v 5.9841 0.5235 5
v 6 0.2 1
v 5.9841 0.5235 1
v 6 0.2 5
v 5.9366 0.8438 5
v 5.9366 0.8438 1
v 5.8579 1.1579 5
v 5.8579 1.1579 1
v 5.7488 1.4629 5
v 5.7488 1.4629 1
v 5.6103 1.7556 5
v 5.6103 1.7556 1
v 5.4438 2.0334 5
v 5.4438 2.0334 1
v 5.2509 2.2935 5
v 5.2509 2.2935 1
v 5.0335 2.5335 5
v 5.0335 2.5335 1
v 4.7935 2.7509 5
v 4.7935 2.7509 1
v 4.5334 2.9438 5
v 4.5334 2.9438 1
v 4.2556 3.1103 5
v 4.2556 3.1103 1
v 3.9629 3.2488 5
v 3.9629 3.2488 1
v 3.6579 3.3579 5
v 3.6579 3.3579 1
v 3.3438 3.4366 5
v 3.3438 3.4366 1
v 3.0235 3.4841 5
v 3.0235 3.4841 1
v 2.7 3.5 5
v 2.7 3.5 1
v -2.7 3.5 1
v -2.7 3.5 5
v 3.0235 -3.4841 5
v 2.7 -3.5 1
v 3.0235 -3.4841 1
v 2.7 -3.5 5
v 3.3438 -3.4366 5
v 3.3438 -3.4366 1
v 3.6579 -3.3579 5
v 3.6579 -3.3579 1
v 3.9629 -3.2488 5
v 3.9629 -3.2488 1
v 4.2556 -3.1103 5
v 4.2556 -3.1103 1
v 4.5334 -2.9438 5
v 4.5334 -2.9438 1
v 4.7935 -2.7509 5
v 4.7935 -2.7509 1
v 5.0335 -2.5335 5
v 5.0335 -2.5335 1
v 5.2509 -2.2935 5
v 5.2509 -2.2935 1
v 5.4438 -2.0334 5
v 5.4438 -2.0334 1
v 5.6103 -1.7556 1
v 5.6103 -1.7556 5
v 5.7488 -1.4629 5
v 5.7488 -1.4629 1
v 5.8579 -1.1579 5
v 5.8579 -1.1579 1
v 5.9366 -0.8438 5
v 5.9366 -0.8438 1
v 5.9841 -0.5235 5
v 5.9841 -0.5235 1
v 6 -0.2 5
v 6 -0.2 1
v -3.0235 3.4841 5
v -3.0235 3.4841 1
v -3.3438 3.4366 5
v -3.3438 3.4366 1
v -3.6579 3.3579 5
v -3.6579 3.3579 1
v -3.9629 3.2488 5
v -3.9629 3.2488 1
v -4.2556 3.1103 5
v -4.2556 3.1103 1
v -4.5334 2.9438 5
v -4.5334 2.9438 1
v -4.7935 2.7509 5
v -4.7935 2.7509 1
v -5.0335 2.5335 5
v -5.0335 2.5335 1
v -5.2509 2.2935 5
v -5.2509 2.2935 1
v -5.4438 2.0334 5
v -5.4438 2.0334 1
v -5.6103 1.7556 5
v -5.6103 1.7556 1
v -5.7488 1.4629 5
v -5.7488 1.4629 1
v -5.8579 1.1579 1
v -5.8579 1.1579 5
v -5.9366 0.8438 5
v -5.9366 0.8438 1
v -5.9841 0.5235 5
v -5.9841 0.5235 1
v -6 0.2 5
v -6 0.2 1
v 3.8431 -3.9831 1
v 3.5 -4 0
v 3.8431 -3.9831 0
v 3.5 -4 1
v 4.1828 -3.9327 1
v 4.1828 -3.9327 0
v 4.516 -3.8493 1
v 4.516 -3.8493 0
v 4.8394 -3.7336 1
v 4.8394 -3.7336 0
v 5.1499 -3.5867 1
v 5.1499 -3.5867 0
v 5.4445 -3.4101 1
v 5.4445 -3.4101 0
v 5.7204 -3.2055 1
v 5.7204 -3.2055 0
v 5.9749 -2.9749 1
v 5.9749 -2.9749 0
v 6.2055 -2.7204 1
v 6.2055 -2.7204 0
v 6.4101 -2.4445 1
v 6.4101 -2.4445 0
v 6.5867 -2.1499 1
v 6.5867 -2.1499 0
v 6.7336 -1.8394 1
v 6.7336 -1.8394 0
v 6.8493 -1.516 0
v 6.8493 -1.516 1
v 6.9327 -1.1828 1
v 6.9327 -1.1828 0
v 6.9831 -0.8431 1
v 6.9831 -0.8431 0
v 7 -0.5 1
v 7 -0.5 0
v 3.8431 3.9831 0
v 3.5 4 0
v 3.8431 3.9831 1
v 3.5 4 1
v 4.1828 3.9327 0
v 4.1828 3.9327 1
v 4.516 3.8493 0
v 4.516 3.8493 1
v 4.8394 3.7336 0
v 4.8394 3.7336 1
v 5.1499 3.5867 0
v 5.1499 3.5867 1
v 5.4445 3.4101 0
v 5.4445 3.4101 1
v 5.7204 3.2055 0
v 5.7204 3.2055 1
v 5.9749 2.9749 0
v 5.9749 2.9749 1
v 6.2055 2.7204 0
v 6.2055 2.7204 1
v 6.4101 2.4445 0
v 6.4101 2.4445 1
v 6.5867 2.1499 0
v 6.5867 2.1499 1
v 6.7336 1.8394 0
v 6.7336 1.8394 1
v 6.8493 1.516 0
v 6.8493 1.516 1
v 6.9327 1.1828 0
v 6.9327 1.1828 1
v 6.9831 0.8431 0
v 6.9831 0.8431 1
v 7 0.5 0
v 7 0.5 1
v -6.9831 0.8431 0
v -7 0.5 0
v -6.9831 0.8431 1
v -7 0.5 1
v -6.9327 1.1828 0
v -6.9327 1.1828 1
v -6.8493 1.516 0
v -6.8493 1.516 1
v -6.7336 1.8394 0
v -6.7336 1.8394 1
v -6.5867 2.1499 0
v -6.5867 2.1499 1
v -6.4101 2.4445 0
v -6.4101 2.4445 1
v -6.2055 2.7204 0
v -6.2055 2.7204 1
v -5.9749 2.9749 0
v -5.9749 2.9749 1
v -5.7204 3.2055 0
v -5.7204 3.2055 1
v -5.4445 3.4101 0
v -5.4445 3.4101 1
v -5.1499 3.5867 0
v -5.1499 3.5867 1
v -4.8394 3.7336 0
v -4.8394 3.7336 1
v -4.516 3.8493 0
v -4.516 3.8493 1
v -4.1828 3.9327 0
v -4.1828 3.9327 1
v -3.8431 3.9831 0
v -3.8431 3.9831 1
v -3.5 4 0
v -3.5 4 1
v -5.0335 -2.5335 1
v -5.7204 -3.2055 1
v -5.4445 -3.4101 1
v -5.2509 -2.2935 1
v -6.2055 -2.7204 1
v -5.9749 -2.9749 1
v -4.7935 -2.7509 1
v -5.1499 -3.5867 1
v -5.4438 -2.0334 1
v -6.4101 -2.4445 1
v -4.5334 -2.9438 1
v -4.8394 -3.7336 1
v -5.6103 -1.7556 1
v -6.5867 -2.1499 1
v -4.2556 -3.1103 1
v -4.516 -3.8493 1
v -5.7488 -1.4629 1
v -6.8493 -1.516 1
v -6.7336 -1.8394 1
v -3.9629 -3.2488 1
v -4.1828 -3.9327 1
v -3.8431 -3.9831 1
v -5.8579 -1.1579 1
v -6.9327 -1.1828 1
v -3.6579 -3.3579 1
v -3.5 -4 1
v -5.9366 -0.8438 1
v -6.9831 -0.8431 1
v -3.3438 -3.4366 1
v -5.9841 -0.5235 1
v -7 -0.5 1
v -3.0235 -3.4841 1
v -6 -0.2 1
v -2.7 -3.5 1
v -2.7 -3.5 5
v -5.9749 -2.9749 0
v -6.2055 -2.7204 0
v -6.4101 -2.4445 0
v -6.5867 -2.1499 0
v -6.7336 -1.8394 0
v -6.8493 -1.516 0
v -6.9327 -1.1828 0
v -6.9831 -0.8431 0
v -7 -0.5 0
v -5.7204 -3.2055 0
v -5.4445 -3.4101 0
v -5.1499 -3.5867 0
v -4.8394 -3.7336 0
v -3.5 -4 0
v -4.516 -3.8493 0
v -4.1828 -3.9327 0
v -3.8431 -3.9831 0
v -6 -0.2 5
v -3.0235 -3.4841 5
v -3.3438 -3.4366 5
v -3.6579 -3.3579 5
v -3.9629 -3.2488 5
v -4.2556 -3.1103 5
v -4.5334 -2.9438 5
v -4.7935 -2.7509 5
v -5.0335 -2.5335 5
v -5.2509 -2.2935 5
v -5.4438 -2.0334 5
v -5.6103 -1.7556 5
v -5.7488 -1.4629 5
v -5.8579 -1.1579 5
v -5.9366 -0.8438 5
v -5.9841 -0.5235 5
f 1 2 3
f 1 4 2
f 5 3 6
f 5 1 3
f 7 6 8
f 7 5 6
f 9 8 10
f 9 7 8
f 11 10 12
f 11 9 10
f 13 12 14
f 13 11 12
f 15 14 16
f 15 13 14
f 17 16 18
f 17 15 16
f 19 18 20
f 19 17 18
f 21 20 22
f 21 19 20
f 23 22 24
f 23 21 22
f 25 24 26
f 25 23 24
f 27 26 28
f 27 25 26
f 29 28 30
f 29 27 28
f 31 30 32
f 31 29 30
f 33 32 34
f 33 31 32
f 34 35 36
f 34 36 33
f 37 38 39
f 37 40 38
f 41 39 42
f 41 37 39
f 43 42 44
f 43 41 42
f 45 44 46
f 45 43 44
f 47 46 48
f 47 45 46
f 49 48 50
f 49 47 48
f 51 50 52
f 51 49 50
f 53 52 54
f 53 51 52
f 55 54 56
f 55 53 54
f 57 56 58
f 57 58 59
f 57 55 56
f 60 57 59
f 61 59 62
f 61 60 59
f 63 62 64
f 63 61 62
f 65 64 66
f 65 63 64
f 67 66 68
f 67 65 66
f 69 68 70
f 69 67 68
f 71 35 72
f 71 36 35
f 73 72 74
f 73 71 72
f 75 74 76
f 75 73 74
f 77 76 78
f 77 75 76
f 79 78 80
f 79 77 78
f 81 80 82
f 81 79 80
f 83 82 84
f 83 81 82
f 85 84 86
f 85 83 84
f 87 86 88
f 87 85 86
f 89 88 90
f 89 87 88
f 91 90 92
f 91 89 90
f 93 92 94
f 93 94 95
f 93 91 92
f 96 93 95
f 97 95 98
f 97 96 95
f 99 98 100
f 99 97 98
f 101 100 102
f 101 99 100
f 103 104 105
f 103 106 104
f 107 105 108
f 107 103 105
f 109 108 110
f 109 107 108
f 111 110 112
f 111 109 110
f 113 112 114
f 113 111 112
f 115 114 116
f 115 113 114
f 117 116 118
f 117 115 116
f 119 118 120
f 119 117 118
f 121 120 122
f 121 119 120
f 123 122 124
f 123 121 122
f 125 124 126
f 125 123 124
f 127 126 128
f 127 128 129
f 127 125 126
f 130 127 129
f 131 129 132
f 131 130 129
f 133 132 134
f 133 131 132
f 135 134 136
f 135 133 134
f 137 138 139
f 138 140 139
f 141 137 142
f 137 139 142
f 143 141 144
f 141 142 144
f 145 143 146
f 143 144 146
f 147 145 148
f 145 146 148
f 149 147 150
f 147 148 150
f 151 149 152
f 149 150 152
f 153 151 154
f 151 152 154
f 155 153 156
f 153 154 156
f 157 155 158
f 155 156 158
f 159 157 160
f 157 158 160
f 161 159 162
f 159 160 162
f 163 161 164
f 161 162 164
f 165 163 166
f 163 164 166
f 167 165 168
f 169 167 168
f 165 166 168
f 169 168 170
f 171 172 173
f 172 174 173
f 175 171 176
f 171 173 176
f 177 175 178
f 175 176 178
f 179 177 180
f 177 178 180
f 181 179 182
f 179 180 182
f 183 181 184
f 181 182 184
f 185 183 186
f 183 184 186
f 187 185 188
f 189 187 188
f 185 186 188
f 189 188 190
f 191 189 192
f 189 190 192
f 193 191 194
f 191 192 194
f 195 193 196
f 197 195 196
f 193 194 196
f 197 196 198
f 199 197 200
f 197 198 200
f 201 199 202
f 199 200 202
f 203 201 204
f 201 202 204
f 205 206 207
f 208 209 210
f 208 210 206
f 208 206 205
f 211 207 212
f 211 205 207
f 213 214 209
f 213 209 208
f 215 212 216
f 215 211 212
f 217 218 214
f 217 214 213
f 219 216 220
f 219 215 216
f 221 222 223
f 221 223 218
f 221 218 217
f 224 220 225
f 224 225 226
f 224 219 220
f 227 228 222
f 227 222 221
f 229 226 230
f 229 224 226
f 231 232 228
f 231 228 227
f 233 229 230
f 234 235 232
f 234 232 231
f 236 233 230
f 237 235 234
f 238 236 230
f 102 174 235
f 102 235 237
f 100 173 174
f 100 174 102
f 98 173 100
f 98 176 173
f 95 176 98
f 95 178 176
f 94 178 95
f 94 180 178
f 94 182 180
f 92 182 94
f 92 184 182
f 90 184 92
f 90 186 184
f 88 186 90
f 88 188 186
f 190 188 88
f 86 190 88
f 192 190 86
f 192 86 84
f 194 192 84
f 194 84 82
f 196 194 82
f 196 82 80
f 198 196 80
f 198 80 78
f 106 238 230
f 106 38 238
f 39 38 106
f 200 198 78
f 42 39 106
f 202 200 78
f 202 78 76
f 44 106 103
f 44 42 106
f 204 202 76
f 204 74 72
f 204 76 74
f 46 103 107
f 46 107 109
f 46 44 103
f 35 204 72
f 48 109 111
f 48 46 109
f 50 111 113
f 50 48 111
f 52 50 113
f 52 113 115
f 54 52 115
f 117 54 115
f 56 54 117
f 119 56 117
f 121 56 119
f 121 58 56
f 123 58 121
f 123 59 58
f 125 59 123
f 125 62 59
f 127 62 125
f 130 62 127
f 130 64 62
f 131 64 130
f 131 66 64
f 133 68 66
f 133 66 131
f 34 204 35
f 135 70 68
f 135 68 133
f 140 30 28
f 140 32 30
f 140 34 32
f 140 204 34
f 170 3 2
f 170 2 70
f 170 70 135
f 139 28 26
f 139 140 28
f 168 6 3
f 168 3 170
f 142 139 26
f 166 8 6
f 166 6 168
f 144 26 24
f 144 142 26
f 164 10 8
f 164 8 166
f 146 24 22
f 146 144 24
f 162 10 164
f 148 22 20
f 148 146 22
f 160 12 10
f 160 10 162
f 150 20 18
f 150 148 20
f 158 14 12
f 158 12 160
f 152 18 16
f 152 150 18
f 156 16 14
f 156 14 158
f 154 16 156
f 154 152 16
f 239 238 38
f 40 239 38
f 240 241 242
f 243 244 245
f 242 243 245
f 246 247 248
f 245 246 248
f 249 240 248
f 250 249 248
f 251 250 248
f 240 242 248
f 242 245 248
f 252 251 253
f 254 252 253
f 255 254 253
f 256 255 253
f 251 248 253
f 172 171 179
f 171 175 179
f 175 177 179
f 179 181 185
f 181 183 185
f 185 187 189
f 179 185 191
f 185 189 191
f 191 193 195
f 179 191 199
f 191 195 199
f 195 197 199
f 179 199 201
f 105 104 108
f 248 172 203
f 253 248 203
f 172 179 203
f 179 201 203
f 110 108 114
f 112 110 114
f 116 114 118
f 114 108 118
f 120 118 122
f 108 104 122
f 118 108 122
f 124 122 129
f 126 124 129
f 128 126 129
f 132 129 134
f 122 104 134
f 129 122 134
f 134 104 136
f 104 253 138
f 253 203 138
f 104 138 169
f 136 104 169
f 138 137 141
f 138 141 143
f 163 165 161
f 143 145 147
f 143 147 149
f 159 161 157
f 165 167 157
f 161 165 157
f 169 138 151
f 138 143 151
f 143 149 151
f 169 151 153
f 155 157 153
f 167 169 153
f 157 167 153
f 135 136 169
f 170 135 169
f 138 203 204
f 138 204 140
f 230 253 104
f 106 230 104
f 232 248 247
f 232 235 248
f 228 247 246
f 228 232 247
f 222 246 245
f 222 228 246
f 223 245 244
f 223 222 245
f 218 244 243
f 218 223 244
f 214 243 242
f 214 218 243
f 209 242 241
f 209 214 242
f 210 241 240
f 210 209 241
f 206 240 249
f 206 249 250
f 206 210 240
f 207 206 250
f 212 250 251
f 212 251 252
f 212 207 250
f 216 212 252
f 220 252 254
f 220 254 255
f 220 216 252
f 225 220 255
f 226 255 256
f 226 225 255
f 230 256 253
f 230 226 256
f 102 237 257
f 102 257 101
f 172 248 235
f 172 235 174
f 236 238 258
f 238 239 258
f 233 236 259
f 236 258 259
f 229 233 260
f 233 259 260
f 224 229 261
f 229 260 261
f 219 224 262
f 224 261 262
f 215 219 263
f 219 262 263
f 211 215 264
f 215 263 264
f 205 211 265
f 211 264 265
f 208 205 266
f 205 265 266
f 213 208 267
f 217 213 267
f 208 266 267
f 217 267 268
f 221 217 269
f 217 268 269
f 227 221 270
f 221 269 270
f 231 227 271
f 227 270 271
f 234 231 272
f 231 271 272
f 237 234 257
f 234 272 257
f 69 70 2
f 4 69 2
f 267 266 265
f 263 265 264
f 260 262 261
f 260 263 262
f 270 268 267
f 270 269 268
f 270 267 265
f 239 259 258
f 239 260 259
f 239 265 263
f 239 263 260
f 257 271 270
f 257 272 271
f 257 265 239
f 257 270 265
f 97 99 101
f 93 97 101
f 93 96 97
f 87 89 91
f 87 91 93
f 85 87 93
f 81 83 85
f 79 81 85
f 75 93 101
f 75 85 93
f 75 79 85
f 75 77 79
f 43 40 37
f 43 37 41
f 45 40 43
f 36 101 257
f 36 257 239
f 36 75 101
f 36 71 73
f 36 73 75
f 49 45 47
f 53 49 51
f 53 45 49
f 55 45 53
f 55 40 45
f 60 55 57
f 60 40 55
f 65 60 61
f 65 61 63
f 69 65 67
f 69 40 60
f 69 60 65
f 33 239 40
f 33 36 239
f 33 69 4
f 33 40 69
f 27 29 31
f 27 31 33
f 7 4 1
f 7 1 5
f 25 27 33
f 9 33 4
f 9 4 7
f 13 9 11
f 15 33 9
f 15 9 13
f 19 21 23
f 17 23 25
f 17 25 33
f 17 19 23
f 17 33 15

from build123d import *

# Parameters (mm, degrees)
SKETCH1_W           = 14
SKETCH1_H           = 8
BOSS_EXTRUDE1_DEPTH = 1
SKETCH2_W           = 12
SKETCH2_H           = 7
BOSS_EXTRUDE2_DEPTH = 4
FILLET2_R           = 3.3
FILLET1_R           = 3.5


with BuildPart() as part:
    # Sketch1 → Boss-Extrude1 (new body)
    with BuildSketch(Plane.XY):
        Rectangle(SKETCH1_W, SKETCH1_H)
    extrude(amount=BOSS_EXTRUDE1_DEPTH)

    # Sketch2 → Boss-Extrude2 (add)
    with BuildSketch(Plane.XY.offset(1)):
        Rectangle(SKETCH2_W, SKETCH2_H)
    extrude(amount=BOSS_EXTRUDE2_DEPTH)

    # Fillet2
    fillet2_edges = [part.edges().sort_by_distance(p)[0] for p in [
        (6, -3.5, 3),
        (6, 3.5, 3),
        (-6, 3.5, 3),
        (-6, -3.5, 3),
    ]]
    fillet(fillet2_edges, radius=FILLET2_R)

    # Fillet1
    fillet1_edges = [part.edges().sort_by_distance(p)[0] for p in [
        (7, -4, 0.5),
        (-7, -4, 0.5),
        (-7, 4, 0.5),
        (7, 4, 0.5),
    ]]
    fillet(fillet1_edges, radius=FILLET1_R)


solid = part.part
